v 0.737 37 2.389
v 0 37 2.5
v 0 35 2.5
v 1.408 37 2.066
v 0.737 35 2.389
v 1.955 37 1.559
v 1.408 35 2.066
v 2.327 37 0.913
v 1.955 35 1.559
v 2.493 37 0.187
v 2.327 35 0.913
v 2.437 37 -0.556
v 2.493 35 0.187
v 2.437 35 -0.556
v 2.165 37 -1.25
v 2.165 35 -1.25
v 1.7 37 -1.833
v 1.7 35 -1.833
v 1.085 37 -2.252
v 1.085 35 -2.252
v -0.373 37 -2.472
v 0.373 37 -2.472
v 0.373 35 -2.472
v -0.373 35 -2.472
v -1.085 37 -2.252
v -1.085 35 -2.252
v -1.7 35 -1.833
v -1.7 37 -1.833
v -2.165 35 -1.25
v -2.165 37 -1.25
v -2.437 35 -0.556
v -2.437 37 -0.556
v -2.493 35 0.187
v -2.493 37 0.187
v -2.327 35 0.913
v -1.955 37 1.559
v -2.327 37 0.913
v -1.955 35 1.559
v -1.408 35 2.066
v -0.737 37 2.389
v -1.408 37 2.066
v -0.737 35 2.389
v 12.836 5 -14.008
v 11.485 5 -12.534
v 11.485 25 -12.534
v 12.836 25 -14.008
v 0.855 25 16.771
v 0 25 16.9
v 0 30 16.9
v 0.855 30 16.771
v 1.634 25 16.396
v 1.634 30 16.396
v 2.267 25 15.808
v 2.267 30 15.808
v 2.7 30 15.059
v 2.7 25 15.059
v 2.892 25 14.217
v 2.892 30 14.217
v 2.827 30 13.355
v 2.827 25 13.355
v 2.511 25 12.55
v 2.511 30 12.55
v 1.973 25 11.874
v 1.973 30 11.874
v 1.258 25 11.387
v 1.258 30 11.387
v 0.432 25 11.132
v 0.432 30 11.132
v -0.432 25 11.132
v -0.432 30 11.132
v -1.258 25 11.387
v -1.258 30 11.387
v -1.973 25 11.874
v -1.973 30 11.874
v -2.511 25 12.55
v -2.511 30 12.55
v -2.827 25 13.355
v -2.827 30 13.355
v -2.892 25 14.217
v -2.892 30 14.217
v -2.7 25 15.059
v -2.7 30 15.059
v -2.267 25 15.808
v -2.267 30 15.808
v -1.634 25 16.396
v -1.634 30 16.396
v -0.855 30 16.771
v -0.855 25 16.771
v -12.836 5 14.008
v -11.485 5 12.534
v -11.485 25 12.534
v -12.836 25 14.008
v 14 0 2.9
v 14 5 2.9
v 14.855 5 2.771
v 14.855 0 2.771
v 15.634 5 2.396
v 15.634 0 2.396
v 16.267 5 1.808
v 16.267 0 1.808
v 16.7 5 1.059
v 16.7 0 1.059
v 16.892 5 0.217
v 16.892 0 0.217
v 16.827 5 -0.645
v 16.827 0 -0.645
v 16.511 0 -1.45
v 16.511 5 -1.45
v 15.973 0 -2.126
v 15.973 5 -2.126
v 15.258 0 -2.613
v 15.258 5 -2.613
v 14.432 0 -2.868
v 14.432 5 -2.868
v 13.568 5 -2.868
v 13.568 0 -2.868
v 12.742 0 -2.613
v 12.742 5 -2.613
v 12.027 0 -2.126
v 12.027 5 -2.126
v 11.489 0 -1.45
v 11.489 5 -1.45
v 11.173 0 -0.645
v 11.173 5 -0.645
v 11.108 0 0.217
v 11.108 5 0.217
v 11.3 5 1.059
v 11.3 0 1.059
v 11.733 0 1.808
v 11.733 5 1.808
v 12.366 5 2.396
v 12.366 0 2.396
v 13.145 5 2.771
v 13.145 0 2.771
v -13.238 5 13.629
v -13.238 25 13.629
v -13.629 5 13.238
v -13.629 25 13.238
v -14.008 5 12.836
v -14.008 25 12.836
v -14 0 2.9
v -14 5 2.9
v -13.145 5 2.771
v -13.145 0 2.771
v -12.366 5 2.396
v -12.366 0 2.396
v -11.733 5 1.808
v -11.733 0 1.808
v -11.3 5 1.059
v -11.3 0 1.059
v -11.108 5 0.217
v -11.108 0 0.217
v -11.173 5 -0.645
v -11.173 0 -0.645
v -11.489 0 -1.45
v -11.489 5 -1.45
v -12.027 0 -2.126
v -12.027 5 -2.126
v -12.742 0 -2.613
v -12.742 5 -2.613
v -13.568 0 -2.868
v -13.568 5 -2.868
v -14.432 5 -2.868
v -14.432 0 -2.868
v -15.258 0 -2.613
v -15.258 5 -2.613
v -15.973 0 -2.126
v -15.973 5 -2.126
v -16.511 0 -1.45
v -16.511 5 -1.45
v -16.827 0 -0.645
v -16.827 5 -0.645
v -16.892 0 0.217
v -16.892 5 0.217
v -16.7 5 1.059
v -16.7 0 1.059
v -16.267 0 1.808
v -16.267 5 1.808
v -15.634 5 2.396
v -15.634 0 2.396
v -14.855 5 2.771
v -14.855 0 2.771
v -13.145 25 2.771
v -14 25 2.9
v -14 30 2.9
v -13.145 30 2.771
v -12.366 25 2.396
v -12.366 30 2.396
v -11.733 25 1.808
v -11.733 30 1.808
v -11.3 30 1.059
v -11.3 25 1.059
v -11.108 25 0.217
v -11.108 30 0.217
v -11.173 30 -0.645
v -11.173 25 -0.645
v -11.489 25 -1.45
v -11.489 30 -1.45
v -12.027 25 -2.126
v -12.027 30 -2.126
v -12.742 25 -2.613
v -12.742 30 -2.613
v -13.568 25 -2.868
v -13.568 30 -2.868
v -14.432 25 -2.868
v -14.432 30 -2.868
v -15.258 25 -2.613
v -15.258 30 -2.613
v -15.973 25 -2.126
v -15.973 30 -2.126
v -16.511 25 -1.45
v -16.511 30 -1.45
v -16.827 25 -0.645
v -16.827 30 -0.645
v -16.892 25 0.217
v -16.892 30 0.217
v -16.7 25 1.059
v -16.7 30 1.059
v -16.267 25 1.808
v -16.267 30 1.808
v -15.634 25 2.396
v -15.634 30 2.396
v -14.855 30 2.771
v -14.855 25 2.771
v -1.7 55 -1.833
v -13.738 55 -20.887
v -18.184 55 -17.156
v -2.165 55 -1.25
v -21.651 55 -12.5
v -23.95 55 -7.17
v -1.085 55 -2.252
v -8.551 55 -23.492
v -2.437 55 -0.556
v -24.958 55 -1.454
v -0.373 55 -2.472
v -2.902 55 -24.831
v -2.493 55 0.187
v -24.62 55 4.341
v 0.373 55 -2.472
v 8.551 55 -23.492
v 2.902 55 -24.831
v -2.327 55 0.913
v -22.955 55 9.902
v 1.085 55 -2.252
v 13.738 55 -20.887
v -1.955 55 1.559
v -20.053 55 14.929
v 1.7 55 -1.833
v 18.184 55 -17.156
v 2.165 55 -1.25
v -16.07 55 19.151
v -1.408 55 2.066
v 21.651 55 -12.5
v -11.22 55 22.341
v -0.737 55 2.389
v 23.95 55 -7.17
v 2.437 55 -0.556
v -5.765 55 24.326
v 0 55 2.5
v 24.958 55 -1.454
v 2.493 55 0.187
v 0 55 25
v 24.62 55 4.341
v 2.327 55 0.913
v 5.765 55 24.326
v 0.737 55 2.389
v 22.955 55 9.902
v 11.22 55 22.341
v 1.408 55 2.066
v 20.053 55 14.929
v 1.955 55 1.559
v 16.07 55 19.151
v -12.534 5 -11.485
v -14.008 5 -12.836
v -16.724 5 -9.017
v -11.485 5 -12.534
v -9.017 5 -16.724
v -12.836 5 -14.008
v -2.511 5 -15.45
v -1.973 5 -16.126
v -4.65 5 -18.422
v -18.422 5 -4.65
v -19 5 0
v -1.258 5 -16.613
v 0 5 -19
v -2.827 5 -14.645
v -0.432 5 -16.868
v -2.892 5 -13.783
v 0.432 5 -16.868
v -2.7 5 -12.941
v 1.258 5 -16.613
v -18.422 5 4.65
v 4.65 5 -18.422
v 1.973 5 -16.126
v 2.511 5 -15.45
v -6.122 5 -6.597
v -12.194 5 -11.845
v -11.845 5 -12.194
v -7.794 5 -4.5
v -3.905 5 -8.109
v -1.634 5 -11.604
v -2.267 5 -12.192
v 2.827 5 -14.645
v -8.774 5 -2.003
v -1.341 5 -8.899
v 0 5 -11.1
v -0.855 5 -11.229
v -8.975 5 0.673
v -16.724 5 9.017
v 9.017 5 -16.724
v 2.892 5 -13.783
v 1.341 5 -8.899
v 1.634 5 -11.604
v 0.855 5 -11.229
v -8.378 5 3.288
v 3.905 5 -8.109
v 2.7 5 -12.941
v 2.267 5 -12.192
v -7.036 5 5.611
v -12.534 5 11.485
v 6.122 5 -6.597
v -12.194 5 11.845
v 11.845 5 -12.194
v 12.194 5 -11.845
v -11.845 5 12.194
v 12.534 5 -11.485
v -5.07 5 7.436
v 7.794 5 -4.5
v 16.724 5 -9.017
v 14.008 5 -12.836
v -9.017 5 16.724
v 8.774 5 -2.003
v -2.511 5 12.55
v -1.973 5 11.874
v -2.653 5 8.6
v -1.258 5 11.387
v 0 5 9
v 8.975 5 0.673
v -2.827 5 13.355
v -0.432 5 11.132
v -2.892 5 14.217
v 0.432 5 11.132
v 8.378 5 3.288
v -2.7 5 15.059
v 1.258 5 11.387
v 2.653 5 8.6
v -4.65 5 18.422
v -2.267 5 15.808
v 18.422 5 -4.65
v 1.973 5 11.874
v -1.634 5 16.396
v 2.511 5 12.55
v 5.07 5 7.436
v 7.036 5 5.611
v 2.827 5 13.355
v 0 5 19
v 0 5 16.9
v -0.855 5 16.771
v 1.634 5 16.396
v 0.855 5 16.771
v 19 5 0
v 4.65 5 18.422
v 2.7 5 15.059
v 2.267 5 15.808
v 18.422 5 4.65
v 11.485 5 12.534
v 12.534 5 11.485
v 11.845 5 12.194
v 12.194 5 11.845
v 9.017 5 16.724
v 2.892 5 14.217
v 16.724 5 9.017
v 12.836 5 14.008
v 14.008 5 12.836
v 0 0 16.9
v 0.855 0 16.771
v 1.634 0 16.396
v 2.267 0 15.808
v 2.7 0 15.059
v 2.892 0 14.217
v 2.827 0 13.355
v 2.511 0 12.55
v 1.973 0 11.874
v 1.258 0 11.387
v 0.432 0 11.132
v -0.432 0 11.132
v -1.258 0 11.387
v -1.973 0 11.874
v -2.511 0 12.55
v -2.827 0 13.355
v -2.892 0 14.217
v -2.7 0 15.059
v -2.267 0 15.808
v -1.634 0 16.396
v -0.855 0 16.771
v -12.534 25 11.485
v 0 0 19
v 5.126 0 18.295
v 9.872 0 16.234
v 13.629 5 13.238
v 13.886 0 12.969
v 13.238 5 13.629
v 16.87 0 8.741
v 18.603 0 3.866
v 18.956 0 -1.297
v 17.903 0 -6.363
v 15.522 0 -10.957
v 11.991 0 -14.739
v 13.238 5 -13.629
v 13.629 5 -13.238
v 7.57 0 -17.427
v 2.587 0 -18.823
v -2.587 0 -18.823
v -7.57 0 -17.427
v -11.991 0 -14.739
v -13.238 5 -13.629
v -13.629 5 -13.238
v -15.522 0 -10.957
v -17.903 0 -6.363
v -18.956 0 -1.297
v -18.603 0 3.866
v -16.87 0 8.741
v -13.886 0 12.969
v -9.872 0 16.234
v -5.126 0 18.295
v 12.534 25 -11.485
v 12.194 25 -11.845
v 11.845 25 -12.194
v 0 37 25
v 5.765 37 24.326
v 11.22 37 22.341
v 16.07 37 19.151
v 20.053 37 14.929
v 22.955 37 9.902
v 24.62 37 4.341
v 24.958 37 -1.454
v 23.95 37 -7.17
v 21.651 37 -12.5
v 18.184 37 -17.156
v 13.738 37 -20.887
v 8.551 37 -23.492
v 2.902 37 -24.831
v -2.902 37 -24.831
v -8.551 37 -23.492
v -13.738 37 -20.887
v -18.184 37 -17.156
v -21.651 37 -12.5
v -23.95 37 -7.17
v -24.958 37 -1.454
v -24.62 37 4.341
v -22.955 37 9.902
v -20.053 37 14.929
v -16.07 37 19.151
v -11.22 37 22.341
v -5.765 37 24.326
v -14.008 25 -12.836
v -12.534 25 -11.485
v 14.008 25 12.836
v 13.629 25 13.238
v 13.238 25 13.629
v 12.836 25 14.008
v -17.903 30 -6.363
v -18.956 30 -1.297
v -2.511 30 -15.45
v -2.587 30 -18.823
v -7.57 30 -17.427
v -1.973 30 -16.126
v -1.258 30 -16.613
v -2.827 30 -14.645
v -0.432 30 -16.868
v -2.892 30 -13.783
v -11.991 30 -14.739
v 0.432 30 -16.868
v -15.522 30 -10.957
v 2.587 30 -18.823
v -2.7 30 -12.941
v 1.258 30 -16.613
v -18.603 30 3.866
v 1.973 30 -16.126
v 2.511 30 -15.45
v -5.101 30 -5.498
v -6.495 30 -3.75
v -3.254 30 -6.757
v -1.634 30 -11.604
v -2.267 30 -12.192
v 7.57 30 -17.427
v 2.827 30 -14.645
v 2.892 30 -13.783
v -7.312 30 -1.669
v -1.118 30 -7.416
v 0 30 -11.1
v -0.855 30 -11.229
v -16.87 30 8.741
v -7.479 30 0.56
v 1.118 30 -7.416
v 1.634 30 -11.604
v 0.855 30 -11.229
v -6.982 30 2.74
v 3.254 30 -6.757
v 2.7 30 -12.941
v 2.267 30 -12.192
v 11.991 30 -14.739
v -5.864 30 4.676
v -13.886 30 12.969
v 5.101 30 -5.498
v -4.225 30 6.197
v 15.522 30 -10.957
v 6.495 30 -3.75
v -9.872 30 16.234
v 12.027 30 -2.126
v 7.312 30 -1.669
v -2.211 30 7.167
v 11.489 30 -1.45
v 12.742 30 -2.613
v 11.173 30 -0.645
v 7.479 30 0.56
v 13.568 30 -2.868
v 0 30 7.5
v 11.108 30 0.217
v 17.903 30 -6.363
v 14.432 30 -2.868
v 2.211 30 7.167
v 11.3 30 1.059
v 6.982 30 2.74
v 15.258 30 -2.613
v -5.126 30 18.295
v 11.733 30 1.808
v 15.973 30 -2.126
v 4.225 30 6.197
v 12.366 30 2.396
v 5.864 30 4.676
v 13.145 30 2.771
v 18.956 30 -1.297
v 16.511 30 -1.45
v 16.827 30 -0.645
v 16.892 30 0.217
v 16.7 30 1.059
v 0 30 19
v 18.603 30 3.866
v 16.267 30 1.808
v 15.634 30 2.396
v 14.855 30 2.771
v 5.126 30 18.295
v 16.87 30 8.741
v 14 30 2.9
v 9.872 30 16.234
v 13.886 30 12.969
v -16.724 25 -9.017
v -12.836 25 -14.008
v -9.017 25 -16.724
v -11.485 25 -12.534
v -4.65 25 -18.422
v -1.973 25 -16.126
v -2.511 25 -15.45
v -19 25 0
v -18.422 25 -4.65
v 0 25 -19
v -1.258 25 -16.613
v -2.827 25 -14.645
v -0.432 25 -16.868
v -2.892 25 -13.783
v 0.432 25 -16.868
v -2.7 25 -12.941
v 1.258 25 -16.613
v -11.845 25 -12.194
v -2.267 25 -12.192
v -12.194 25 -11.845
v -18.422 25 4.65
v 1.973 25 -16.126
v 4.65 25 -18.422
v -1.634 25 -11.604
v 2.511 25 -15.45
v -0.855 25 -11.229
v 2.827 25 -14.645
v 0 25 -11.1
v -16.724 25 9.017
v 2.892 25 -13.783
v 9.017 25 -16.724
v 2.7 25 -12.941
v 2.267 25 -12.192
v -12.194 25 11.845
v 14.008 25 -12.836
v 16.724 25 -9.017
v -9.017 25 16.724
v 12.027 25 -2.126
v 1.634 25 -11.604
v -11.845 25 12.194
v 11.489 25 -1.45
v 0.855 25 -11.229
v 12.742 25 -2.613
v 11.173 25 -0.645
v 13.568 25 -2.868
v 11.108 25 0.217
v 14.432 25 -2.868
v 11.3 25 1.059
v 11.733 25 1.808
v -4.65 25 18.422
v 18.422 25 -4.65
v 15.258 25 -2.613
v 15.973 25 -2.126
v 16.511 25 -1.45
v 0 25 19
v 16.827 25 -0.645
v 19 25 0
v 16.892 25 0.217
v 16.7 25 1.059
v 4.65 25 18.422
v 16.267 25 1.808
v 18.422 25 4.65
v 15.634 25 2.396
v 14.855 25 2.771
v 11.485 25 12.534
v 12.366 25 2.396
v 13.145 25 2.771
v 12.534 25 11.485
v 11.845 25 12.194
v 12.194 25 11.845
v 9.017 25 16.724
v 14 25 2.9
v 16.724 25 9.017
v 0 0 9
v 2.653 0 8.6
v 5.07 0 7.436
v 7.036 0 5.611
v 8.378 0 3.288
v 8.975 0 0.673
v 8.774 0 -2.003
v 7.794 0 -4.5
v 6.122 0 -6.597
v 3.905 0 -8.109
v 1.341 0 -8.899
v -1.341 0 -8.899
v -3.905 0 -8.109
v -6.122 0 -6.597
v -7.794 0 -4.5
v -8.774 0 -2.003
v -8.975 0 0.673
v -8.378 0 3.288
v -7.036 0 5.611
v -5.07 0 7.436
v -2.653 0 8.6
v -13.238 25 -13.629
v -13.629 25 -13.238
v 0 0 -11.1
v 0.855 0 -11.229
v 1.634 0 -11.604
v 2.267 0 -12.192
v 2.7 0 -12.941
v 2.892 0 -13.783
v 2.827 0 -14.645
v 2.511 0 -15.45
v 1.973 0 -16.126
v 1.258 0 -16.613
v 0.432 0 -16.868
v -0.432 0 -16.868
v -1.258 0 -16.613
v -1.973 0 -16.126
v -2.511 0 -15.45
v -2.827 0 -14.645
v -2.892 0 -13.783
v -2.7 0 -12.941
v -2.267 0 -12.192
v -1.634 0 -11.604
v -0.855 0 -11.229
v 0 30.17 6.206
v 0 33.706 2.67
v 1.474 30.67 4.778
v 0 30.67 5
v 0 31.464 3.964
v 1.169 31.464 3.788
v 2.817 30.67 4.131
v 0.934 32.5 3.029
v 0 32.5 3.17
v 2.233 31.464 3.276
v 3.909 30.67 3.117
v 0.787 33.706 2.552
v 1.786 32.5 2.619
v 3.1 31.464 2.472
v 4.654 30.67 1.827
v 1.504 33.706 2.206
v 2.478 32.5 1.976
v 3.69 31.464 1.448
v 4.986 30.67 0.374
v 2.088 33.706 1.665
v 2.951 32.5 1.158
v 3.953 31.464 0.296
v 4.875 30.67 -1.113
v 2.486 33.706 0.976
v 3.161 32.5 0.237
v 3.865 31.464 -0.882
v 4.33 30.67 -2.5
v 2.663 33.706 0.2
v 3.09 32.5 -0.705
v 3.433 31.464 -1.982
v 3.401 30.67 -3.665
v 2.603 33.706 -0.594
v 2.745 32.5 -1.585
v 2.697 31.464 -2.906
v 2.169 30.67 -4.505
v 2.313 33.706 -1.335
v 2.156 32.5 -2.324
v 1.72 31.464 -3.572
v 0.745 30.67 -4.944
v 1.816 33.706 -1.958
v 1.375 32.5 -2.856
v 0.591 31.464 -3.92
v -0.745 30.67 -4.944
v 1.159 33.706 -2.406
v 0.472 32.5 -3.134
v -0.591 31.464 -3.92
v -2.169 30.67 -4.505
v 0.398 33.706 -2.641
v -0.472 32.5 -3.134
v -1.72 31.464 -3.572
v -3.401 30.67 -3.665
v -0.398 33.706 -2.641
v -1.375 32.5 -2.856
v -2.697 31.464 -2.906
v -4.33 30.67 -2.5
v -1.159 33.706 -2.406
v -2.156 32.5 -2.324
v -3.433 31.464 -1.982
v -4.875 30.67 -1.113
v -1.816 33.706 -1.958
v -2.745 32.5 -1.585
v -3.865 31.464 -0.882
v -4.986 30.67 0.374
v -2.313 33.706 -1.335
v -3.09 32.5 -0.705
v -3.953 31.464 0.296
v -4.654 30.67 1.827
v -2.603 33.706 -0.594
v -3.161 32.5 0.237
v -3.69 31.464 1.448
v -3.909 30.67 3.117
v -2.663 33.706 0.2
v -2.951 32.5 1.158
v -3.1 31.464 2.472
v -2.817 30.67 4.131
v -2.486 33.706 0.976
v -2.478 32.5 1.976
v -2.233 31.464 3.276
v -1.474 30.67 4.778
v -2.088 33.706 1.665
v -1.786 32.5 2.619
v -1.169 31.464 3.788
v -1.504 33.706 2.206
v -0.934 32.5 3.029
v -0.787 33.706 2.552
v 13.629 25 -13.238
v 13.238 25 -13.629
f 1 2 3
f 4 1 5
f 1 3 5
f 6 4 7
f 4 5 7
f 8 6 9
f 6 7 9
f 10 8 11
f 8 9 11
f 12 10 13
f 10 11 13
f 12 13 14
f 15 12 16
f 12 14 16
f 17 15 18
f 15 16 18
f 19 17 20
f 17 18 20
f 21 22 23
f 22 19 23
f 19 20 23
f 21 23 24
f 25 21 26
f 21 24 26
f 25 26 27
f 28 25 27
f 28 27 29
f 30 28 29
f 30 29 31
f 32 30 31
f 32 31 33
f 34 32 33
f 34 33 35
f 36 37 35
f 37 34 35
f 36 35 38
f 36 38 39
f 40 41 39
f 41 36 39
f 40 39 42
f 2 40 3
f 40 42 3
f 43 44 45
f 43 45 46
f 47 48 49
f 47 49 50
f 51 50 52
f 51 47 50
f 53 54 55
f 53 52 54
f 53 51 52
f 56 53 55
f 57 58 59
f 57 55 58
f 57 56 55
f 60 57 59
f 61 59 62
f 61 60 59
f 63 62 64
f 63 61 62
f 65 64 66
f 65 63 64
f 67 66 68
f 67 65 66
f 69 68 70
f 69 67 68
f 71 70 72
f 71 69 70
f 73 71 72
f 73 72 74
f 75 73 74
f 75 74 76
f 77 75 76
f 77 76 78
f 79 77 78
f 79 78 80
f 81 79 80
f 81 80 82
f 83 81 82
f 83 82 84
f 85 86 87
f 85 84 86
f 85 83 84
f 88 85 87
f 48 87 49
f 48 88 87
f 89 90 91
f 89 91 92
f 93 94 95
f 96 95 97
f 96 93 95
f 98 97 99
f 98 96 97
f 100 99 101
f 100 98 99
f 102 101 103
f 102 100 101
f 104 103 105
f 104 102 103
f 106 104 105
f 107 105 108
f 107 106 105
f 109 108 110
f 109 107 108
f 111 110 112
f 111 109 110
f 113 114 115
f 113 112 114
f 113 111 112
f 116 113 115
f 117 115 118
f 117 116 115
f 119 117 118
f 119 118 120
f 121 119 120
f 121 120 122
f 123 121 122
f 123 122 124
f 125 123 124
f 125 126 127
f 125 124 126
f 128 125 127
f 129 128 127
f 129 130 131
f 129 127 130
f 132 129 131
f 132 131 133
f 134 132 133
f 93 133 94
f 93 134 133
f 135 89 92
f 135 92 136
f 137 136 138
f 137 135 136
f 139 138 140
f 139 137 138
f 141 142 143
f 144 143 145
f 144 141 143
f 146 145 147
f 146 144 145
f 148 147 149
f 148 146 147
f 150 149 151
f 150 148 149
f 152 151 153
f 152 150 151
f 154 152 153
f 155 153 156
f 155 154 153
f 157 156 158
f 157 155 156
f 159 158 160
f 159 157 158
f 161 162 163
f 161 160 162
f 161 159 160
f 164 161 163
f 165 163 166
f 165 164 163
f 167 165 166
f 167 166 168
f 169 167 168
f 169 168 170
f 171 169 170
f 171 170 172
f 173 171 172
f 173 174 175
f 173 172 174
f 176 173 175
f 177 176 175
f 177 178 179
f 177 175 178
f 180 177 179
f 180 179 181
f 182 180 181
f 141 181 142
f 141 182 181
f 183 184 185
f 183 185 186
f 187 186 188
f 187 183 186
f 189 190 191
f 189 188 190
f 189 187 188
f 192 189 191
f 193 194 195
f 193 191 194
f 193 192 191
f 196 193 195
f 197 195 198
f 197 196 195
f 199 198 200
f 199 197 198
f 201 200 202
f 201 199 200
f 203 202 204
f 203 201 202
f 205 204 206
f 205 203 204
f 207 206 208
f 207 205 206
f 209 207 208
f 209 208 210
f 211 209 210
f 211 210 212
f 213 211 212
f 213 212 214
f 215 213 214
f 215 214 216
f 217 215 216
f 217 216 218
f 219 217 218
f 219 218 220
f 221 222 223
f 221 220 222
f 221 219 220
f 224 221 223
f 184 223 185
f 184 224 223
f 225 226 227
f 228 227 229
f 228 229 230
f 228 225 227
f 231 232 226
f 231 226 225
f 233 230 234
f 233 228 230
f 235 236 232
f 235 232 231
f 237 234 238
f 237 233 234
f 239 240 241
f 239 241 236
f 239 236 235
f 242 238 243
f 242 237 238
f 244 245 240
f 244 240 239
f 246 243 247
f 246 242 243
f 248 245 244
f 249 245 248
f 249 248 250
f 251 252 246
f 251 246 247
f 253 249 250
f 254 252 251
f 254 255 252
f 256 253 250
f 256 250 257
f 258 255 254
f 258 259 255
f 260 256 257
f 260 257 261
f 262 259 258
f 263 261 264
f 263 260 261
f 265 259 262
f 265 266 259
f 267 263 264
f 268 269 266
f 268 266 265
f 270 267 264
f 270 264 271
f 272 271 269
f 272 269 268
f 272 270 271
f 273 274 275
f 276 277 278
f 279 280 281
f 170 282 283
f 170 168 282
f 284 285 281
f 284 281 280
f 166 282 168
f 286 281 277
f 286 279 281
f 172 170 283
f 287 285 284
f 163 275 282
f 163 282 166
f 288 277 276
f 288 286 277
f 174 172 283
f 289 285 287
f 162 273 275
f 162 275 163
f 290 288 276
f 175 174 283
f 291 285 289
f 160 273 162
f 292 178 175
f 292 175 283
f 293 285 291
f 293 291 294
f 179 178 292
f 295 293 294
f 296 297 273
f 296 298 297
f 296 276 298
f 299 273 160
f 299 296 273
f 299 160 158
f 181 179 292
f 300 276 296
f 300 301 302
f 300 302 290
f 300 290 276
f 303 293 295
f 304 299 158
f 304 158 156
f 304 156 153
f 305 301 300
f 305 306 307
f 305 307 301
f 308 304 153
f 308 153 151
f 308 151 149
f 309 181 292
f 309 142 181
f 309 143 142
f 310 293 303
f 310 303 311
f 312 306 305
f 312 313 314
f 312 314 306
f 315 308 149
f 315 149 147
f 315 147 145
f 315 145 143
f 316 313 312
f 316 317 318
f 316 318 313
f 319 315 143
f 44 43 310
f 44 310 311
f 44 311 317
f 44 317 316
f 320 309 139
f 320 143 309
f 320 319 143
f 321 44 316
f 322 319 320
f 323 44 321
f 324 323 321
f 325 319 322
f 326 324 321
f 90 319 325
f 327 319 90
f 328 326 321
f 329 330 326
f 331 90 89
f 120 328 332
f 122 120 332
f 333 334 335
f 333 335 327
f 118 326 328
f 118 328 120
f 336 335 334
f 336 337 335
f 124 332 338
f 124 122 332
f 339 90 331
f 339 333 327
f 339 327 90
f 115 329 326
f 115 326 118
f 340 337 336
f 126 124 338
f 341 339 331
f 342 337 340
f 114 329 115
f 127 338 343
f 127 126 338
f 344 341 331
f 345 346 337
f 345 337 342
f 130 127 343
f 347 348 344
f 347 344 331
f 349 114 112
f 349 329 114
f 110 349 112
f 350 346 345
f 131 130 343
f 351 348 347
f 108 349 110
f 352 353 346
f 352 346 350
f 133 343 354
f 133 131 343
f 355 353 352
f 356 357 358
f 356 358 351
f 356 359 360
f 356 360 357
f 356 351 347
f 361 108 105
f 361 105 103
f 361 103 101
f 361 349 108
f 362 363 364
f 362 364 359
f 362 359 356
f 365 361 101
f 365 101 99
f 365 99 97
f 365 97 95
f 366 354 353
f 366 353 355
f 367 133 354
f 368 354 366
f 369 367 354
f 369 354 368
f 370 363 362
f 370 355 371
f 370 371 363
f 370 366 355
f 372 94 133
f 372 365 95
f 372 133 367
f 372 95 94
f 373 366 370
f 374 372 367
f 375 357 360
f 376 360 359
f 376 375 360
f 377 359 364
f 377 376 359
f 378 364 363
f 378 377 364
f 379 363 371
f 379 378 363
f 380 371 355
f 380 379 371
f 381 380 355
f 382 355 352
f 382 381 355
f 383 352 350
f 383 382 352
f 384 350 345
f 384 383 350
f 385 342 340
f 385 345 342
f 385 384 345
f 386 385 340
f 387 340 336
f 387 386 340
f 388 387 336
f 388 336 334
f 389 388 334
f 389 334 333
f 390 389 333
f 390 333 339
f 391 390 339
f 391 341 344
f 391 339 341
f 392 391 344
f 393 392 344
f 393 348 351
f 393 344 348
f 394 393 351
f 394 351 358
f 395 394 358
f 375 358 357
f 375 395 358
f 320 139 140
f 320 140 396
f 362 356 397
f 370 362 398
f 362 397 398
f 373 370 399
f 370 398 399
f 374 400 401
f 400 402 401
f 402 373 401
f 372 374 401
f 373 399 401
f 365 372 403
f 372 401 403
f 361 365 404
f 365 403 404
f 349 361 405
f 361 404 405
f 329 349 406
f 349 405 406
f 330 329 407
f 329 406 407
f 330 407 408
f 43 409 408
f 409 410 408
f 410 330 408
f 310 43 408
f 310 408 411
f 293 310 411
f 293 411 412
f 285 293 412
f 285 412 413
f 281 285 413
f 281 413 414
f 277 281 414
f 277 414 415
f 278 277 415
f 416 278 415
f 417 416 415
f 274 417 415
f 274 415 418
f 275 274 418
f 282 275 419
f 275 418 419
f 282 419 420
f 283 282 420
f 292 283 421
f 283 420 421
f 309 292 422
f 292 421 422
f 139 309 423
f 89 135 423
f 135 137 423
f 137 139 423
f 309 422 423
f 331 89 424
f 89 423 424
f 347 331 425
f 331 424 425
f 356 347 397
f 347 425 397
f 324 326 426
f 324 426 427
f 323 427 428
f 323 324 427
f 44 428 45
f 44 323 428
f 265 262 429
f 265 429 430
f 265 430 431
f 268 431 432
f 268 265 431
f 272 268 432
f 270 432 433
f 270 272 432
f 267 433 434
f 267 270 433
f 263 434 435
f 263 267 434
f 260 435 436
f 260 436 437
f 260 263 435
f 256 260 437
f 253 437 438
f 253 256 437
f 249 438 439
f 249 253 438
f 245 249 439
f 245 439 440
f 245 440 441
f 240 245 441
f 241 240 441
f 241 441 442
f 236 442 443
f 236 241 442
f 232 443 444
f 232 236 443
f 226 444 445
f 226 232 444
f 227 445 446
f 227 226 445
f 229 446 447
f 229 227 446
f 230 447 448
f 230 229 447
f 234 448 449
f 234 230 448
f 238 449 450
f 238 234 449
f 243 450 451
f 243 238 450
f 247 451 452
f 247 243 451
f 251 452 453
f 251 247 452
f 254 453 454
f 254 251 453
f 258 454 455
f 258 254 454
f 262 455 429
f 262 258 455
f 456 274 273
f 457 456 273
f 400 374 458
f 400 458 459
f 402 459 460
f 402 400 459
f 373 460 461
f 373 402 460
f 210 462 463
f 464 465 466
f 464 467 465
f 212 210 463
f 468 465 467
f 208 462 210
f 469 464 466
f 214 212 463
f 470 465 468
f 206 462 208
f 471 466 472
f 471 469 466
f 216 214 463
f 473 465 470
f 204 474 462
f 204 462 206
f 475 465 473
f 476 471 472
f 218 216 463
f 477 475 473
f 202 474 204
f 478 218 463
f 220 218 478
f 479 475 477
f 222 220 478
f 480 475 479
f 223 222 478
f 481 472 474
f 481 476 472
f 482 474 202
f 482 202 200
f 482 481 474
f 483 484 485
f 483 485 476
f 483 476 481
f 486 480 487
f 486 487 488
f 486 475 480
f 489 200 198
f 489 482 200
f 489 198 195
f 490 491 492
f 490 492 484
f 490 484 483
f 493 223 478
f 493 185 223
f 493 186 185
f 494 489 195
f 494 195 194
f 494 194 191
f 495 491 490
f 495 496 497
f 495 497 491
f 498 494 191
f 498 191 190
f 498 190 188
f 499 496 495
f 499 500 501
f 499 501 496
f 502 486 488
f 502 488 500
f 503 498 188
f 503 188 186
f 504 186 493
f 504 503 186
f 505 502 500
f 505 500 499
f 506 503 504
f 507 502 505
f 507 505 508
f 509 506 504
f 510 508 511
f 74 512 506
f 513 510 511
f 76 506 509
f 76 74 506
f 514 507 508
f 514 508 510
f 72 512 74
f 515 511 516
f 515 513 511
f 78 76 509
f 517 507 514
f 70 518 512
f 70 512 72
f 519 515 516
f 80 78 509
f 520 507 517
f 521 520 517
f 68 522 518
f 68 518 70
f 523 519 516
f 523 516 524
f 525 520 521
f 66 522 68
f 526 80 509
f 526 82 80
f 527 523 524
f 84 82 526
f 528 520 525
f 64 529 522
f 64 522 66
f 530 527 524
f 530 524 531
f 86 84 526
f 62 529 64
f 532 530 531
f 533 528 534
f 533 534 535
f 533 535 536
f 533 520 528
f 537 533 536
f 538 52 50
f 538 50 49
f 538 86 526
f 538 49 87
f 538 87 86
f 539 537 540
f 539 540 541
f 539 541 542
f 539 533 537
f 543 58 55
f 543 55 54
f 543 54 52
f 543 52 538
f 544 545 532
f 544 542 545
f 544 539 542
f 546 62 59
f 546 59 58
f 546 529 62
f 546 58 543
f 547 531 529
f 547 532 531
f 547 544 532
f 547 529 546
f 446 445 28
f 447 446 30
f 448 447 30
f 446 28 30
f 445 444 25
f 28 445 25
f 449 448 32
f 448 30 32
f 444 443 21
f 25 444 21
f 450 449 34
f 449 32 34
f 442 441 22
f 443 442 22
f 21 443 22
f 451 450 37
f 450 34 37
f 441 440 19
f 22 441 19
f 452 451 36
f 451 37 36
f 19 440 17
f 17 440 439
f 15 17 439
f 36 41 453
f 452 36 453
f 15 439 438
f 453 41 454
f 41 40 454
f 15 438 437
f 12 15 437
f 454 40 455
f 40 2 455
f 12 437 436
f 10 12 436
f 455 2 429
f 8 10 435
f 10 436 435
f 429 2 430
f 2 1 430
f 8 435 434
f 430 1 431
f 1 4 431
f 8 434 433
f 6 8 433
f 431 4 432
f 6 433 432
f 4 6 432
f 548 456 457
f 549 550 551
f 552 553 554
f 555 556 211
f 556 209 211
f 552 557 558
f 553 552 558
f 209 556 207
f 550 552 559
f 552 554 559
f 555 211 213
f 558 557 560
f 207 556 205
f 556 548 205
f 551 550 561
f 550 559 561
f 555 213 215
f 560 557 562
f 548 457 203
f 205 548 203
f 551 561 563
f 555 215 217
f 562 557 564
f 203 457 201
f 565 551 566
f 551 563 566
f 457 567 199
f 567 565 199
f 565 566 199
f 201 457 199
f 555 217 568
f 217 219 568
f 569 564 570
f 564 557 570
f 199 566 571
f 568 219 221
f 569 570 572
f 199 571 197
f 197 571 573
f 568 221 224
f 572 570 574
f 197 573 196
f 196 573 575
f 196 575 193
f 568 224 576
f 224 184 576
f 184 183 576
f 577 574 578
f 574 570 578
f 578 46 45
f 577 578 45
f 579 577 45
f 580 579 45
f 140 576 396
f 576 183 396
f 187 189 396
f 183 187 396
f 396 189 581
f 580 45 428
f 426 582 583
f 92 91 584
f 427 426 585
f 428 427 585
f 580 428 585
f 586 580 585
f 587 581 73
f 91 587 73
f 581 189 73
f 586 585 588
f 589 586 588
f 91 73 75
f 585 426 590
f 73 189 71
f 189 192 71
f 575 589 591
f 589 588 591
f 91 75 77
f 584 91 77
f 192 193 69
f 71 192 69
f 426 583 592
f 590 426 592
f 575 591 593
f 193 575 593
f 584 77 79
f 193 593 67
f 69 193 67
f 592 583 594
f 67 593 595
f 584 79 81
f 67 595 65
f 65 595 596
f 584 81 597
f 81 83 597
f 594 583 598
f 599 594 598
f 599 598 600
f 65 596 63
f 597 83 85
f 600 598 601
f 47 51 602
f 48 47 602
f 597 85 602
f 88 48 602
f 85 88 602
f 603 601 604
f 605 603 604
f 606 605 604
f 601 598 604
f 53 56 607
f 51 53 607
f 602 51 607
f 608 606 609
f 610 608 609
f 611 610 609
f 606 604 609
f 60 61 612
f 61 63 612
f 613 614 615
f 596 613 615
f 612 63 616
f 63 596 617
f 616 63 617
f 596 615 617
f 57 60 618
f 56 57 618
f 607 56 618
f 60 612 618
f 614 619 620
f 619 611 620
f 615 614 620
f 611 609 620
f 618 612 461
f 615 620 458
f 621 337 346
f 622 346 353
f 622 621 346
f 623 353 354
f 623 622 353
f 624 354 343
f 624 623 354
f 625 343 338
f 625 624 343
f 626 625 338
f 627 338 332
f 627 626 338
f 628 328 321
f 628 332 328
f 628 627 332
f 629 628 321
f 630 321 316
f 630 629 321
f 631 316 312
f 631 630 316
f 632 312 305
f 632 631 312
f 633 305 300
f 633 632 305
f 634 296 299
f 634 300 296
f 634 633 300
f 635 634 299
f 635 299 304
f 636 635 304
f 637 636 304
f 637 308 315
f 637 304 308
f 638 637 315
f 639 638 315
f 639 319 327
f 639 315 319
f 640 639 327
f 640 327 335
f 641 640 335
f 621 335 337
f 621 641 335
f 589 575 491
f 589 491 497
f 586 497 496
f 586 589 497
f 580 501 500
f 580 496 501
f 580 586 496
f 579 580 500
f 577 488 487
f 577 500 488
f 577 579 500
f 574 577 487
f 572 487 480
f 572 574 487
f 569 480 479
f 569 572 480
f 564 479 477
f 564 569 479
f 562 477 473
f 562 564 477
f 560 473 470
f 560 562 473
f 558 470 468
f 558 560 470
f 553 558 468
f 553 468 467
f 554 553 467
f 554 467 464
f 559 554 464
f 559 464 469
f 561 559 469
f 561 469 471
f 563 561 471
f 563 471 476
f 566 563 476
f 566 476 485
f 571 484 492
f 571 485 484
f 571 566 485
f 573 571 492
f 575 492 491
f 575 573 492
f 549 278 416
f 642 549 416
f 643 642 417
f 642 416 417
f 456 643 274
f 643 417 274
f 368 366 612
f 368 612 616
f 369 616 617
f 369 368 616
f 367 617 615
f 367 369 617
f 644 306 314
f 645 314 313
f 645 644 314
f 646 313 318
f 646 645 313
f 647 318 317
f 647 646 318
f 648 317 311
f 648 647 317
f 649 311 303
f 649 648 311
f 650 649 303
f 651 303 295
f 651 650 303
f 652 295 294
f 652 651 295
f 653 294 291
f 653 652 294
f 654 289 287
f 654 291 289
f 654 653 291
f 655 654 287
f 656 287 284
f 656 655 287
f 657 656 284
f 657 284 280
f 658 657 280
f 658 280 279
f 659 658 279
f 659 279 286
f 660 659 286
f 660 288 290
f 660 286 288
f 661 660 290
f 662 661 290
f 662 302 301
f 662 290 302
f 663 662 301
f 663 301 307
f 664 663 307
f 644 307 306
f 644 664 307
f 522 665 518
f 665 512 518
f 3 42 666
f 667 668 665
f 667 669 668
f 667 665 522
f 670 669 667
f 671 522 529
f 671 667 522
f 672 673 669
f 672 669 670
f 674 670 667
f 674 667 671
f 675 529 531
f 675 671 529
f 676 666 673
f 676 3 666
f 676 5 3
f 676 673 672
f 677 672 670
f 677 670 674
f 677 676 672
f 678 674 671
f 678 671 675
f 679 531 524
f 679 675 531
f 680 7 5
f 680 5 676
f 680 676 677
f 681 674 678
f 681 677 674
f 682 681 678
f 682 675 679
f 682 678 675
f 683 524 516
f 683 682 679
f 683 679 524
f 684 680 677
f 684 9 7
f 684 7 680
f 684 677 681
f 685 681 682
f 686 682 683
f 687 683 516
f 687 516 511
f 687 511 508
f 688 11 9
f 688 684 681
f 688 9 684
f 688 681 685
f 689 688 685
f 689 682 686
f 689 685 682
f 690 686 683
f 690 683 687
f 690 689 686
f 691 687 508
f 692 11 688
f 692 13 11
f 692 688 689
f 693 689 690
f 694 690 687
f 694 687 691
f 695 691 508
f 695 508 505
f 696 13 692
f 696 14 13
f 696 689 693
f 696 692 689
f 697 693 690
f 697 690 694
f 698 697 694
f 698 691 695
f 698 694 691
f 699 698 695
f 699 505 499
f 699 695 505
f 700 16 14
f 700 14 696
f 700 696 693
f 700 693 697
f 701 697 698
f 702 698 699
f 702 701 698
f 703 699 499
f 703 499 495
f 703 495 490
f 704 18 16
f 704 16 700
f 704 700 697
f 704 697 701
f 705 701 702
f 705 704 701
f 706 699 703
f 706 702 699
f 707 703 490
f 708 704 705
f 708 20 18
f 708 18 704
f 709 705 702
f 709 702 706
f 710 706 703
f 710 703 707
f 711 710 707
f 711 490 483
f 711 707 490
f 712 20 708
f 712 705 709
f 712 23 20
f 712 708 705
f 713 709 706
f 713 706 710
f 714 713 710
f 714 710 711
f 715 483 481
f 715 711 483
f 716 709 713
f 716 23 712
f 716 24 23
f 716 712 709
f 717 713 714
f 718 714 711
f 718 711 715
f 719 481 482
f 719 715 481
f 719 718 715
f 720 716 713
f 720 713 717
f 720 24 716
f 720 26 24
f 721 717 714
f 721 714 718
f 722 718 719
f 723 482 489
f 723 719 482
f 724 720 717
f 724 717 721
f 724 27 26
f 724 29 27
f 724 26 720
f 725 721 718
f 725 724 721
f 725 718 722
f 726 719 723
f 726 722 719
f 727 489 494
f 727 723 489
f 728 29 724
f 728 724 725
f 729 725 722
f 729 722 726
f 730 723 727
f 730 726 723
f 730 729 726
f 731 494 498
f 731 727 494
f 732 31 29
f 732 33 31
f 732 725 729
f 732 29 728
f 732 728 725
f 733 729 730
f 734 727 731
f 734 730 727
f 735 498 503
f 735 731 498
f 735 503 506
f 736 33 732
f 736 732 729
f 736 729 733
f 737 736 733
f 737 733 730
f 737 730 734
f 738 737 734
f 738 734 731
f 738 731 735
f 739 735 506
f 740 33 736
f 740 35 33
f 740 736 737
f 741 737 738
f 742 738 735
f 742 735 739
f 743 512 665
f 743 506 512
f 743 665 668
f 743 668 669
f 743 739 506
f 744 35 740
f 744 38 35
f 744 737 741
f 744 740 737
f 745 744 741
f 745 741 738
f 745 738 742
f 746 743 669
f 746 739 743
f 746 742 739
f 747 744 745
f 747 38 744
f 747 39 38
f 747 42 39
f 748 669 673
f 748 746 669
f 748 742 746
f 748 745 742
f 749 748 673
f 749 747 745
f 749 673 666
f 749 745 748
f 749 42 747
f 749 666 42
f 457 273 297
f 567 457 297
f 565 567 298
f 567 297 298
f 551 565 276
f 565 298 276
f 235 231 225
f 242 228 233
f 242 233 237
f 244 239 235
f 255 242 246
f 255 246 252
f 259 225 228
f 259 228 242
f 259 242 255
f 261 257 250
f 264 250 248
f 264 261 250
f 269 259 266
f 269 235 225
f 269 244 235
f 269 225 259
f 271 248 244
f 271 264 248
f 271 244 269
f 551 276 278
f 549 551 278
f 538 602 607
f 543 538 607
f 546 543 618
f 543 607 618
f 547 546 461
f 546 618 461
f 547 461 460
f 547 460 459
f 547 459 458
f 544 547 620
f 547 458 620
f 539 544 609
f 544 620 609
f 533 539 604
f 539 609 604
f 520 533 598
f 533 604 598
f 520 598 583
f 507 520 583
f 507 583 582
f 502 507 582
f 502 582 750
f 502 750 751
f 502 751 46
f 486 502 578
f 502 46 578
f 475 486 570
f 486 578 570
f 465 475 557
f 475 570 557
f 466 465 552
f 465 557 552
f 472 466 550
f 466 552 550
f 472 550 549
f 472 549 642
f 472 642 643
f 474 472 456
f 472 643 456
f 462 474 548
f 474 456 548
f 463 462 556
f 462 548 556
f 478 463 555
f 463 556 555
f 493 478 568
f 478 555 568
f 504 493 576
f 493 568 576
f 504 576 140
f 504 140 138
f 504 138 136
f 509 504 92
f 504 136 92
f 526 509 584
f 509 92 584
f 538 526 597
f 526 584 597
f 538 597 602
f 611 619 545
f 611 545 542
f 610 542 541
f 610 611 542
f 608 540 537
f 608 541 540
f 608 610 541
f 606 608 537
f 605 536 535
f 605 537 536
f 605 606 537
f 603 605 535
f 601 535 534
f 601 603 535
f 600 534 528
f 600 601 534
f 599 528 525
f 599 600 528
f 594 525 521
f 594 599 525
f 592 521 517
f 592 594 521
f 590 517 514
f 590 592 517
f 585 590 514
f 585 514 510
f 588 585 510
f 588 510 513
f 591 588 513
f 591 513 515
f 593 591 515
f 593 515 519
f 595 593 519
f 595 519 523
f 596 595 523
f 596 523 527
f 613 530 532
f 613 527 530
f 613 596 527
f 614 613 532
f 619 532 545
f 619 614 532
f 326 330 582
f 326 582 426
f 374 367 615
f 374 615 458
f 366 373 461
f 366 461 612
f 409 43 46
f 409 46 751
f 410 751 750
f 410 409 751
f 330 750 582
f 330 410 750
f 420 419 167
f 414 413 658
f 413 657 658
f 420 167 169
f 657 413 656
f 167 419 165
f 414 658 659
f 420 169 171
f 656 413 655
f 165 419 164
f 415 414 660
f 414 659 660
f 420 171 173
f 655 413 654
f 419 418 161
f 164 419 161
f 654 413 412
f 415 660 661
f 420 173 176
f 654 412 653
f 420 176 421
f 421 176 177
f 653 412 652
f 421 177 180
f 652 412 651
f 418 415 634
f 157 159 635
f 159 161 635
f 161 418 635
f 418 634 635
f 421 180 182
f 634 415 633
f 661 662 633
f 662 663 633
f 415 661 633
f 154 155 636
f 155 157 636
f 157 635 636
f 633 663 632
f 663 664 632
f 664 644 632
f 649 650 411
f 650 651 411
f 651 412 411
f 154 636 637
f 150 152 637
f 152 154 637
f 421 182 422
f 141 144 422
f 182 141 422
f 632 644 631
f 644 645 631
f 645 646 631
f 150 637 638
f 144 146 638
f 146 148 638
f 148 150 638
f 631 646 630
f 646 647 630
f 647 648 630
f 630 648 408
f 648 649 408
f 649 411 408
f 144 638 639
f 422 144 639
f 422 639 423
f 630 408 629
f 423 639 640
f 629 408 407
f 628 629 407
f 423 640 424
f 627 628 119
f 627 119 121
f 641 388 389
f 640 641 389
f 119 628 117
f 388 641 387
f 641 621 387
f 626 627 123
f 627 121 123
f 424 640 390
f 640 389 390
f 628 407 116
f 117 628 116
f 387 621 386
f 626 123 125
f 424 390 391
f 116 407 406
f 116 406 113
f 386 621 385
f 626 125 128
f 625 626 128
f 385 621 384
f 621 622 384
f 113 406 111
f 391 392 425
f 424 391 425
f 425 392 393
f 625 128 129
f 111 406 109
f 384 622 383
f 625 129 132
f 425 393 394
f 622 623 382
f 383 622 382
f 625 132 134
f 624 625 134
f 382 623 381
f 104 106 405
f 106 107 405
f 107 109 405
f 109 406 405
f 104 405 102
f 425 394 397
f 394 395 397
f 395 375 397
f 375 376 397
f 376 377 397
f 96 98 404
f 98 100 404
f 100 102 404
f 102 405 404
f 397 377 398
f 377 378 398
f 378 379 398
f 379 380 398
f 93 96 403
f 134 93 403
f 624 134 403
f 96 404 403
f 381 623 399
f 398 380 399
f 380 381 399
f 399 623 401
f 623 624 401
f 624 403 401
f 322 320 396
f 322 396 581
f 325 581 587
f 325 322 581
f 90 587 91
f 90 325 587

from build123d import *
from build123d.topology import SkipClean

# Parameters (mm, degrees)
SKETCH1_R               = 19
BOSS_EXTRUDE1_DEPTH     = 5
BOSS_EXTRUDE4_DEPTH     = 20
SKETCH5_R               = 19
BOSS_EXTRUDE5_DEPTH     = 5
CUT_EXTRUDE1_DEPTH      = 37.701498607
CUT_EXTRUDE1_DEPTH_BACK = 5
SKETCH2_7_R             = 2.9
SKETCH1_3_R             = 9
CUT_EXTRUDE2_DEPTH      = 10
SKETCH6_R               = 2.5
BOSS_EXTRUDE7_DEPTH     = 25
FILLET1_R               = 5
SKETCH8_R               = 25
BOSS_EXTRUDE8_DEPTH     = 18


with BuildPart() as part:
    # Sketch1 → Boss-Extrude1 (new body)
    with BuildSketch(Plane(origin=(0, 0, 0), x_dir=(1, 0, 0), z_dir=(0, 1, 0))):
        Circle(SKETCH1_R)
    extrude(amount=BOSS_EXTRUDE1_DEPTH)

    # Sketch2 → Boss-Extrude4 (add)
    with SkipClean():  # the faces are left unmerged after this step: merging them gives an invalid solid
        with BuildSketch(Plane(origin=(0, 5, 0), x_dir=(1, 0, 0), z_dir=(0, 1, 0))):
            with BuildLine():
                Line((-14.008269399, 12.836213945), (-12.533714726, 11.485033529))
                ThreePointArc((-12.533714726, 11.485033529), (-12.02081528, 12.02081528), (-11.485033529, 12.533714726))
                Line((-11.485033529, 12.533714726), (-12.836213945, 14.008269399))
                ThreePointArc((-12.836213945, 14.008269399), (-13.435028843, 13.435028843), (-14.008269399, 12.836213945))
            make_face()
            with BuildLine():
                Line((14.008269399, 12.836213945), (12.533714726, 11.485033529))
                ThreePointArc((12.533714726, 11.485033529), (12.02081528, 12.02081528), (11.485033529, 12.533714726))
                Line((11.485033529, 12.533714726), (12.836213945, 14.008269399))
                ThreePointArc((12.836213945, 14.008269399), (13.435028843, 13.435028843), (14.008269399, 12.836213945))
            make_face()
            with BuildLine():
                Line((12.836213945, -14.008269399), (11.485033529, -12.533714726))
                ThreePointArc((11.485033529, -12.533714726), (12.02081528, -12.02081528), (12.533714726, -11.485033529))
                Line((12.533714726, -11.485033529), (14.008269399, -12.836213945))
                ThreePointArc((14.008269399, -12.836213945), (13.435028843, -13.435028843), (12.836213945, -14.008269399))
            make_face()
            with BuildLine():
                Line((-14.008269399, -12.836213945), (-12.533714726, -11.485033529))
                ThreePointArc((-12.533714726, -11.485033529), (-12.02081528, -12.02081528), (-11.485033529, -12.533714726))
                Line((-11.485033529, -12.533714726), (-12.836213945, -14.008269399))
                ThreePointArc((-12.836213945, -14.008269399), (-13.435028843, -13.435028843), (-14.008269399, -12.836213945))
            make_face()
        extrude(amount=BOSS_EXTRUDE4_DEPTH)

    # Sketch5 → Boss-Extrude5 (add)
    with SkipClean():  # the faces are left unmerged after this step: merging them gives an invalid solid
        with BuildSketch(Plane(origin=(0, 25, 0), x_dir=(1, 0, 0), z_dir=(0, 1, 0))):
            Circle(SKETCH5_R)
        extrude(amount=BOSS_EXTRUDE5_DEPTH)

    # Sketch2<7> → Cut-Extrude1 (cut, two sides: drawn at the far end of the back side and taken through both)
    with SkipClean():  # the faces are left unmerged after this step: merging them gives an invalid solid
        with BuildSketch(Plane(origin=(0, 5, 0), x_dir=(1, 0, 0), z_dir=(0, 1, 0)).offset(-CUT_EXTRUDE1_DEPTH_BACK)):
            with Locations((0, 14)):
                Circle(SKETCH2_7_R)
            with Locations((14, 0)):
                Circle(SKETCH2_7_R)
            with Locations((0, -14)):
                Circle(SKETCH2_7_R)
            with Locations((-14, 0)):
                Circle(SKETCH2_7_R)
        extrude(amount=CUT_EXTRUDE1_DEPTH + CUT_EXTRUDE1_DEPTH_BACK, mode=Mode.SUBTRACT)

    # Sketch1<3> → Cut-Extrude2 (cut)
    with SkipClean():  # the faces are left unmerged after this step: merging them gives an invalid solid
        with BuildSketch(Plane(origin=(0, 0, 0), x_dir=(1, 0, 0), z_dir=(0, 1, 0))):
            Circle(SKETCH1_3_R)
        extrude(amount=CUT_EXTRUDE2_DEPTH, mode=Mode.SUBTRACT)

    # Sketch6 → Boss-Extrude7 (add)
    with SkipClean():  # the faces are left unmerged after this step: merging them gives an invalid solid
        with BuildSketch(Plane(origin=(0, 30, 0), x_dir=(1, 0, 0), z_dir=(0, 1, 0))):
            Circle(SKETCH6_R)
        extrude(amount=BOSS_EXTRUDE7_DEPTH)

    # Fillet1
    fillet1_edges = [part.edges().sort_by_distance(p)[0] for p in [
        (-2.5, 30, 0),
    ]]
    fillet(fillet1_edges, radius=FILLET1_R)

    # Sketch8 → Boss-Extrude8 (add)
    with SkipClean():  # the faces are left unmerged after this step: merging them gives an invalid solid
        with BuildSketch(Plane(origin=(0, 55, 0), x_dir=(1, 0, 0), z_dir=(0, 1, 0))):
            Circle(SKETCH8_R)
        extrude(amount=-BOSS_EXTRUDE8_DEPTH)


solid = part.part
